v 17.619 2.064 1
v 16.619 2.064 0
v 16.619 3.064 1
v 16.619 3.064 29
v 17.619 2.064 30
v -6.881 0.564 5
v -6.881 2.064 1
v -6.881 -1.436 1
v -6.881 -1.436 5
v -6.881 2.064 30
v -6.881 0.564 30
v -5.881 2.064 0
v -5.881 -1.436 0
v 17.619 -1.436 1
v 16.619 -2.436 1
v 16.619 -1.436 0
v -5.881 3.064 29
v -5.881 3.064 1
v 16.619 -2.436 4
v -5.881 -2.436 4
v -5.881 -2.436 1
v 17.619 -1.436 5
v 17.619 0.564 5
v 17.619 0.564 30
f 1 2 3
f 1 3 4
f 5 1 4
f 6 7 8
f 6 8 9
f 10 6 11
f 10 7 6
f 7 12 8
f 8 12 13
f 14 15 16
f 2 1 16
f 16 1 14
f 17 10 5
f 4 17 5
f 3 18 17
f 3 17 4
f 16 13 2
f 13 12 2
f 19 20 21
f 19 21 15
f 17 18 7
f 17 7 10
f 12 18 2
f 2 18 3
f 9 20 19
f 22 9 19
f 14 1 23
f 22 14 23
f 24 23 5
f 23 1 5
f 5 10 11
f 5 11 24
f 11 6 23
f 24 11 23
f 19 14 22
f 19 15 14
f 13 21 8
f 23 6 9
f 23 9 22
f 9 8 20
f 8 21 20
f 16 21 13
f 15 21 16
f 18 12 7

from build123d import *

# Parameters (mm, degrees)
SKETCH006_W  = 24.5
SKETCH006_H  = 2.5
PAD003_DEPTH = 30
SKETCH007_W  = 24.5
SKETCH007_H  = 5
PAD004_DEPTH = 3
CHAMFER_SIZE = 1


with BuildPart() as part:
    # Sketch006 (on XY_Plane003 of Origin006) → Pad003 (new body)
    with BuildSketch(Plane.XY):
        with Locations((5.368647, 1.814191)):
            Rectangle(SKETCH006_W, SKETCH006_H)
    extrude(amount=PAD003_DEPTH)

    # Sketch007 (on Face1 of Pad003) → Pad004 (join)
    with BuildSketch(Plane.XZ.offset(-0.564191)):
        with Locations((5.368647, 2.5)):
            Rectangle(SKETCH007_W, SKETCH007_H)
    extrude(amount=PAD004_DEPTH)

    # Chamfer
    chamfer_edges = [part.edges().sort_by_distance(p)[0] for p in [
        (17.618647, -2.435809, 2.5),
        (5.368647, -2.435809, 5),
        (-6.881353, -2.435809, 2.5),
        (5.368647, -2.435809, 0),
        (17.618647, 0.314191, 0),
        (-6.881353, 0.314191, 0),
        (5.368647, 3.064191, 0),
        (17.618647, 3.064191, 15),
        (-6.881353, 3.064191, 15),
        (5.368647, 3.064191, 30),
    ]]
    chamfer(chamfer_edges, length=CHAMFER_SIZE)


solid = part.part
